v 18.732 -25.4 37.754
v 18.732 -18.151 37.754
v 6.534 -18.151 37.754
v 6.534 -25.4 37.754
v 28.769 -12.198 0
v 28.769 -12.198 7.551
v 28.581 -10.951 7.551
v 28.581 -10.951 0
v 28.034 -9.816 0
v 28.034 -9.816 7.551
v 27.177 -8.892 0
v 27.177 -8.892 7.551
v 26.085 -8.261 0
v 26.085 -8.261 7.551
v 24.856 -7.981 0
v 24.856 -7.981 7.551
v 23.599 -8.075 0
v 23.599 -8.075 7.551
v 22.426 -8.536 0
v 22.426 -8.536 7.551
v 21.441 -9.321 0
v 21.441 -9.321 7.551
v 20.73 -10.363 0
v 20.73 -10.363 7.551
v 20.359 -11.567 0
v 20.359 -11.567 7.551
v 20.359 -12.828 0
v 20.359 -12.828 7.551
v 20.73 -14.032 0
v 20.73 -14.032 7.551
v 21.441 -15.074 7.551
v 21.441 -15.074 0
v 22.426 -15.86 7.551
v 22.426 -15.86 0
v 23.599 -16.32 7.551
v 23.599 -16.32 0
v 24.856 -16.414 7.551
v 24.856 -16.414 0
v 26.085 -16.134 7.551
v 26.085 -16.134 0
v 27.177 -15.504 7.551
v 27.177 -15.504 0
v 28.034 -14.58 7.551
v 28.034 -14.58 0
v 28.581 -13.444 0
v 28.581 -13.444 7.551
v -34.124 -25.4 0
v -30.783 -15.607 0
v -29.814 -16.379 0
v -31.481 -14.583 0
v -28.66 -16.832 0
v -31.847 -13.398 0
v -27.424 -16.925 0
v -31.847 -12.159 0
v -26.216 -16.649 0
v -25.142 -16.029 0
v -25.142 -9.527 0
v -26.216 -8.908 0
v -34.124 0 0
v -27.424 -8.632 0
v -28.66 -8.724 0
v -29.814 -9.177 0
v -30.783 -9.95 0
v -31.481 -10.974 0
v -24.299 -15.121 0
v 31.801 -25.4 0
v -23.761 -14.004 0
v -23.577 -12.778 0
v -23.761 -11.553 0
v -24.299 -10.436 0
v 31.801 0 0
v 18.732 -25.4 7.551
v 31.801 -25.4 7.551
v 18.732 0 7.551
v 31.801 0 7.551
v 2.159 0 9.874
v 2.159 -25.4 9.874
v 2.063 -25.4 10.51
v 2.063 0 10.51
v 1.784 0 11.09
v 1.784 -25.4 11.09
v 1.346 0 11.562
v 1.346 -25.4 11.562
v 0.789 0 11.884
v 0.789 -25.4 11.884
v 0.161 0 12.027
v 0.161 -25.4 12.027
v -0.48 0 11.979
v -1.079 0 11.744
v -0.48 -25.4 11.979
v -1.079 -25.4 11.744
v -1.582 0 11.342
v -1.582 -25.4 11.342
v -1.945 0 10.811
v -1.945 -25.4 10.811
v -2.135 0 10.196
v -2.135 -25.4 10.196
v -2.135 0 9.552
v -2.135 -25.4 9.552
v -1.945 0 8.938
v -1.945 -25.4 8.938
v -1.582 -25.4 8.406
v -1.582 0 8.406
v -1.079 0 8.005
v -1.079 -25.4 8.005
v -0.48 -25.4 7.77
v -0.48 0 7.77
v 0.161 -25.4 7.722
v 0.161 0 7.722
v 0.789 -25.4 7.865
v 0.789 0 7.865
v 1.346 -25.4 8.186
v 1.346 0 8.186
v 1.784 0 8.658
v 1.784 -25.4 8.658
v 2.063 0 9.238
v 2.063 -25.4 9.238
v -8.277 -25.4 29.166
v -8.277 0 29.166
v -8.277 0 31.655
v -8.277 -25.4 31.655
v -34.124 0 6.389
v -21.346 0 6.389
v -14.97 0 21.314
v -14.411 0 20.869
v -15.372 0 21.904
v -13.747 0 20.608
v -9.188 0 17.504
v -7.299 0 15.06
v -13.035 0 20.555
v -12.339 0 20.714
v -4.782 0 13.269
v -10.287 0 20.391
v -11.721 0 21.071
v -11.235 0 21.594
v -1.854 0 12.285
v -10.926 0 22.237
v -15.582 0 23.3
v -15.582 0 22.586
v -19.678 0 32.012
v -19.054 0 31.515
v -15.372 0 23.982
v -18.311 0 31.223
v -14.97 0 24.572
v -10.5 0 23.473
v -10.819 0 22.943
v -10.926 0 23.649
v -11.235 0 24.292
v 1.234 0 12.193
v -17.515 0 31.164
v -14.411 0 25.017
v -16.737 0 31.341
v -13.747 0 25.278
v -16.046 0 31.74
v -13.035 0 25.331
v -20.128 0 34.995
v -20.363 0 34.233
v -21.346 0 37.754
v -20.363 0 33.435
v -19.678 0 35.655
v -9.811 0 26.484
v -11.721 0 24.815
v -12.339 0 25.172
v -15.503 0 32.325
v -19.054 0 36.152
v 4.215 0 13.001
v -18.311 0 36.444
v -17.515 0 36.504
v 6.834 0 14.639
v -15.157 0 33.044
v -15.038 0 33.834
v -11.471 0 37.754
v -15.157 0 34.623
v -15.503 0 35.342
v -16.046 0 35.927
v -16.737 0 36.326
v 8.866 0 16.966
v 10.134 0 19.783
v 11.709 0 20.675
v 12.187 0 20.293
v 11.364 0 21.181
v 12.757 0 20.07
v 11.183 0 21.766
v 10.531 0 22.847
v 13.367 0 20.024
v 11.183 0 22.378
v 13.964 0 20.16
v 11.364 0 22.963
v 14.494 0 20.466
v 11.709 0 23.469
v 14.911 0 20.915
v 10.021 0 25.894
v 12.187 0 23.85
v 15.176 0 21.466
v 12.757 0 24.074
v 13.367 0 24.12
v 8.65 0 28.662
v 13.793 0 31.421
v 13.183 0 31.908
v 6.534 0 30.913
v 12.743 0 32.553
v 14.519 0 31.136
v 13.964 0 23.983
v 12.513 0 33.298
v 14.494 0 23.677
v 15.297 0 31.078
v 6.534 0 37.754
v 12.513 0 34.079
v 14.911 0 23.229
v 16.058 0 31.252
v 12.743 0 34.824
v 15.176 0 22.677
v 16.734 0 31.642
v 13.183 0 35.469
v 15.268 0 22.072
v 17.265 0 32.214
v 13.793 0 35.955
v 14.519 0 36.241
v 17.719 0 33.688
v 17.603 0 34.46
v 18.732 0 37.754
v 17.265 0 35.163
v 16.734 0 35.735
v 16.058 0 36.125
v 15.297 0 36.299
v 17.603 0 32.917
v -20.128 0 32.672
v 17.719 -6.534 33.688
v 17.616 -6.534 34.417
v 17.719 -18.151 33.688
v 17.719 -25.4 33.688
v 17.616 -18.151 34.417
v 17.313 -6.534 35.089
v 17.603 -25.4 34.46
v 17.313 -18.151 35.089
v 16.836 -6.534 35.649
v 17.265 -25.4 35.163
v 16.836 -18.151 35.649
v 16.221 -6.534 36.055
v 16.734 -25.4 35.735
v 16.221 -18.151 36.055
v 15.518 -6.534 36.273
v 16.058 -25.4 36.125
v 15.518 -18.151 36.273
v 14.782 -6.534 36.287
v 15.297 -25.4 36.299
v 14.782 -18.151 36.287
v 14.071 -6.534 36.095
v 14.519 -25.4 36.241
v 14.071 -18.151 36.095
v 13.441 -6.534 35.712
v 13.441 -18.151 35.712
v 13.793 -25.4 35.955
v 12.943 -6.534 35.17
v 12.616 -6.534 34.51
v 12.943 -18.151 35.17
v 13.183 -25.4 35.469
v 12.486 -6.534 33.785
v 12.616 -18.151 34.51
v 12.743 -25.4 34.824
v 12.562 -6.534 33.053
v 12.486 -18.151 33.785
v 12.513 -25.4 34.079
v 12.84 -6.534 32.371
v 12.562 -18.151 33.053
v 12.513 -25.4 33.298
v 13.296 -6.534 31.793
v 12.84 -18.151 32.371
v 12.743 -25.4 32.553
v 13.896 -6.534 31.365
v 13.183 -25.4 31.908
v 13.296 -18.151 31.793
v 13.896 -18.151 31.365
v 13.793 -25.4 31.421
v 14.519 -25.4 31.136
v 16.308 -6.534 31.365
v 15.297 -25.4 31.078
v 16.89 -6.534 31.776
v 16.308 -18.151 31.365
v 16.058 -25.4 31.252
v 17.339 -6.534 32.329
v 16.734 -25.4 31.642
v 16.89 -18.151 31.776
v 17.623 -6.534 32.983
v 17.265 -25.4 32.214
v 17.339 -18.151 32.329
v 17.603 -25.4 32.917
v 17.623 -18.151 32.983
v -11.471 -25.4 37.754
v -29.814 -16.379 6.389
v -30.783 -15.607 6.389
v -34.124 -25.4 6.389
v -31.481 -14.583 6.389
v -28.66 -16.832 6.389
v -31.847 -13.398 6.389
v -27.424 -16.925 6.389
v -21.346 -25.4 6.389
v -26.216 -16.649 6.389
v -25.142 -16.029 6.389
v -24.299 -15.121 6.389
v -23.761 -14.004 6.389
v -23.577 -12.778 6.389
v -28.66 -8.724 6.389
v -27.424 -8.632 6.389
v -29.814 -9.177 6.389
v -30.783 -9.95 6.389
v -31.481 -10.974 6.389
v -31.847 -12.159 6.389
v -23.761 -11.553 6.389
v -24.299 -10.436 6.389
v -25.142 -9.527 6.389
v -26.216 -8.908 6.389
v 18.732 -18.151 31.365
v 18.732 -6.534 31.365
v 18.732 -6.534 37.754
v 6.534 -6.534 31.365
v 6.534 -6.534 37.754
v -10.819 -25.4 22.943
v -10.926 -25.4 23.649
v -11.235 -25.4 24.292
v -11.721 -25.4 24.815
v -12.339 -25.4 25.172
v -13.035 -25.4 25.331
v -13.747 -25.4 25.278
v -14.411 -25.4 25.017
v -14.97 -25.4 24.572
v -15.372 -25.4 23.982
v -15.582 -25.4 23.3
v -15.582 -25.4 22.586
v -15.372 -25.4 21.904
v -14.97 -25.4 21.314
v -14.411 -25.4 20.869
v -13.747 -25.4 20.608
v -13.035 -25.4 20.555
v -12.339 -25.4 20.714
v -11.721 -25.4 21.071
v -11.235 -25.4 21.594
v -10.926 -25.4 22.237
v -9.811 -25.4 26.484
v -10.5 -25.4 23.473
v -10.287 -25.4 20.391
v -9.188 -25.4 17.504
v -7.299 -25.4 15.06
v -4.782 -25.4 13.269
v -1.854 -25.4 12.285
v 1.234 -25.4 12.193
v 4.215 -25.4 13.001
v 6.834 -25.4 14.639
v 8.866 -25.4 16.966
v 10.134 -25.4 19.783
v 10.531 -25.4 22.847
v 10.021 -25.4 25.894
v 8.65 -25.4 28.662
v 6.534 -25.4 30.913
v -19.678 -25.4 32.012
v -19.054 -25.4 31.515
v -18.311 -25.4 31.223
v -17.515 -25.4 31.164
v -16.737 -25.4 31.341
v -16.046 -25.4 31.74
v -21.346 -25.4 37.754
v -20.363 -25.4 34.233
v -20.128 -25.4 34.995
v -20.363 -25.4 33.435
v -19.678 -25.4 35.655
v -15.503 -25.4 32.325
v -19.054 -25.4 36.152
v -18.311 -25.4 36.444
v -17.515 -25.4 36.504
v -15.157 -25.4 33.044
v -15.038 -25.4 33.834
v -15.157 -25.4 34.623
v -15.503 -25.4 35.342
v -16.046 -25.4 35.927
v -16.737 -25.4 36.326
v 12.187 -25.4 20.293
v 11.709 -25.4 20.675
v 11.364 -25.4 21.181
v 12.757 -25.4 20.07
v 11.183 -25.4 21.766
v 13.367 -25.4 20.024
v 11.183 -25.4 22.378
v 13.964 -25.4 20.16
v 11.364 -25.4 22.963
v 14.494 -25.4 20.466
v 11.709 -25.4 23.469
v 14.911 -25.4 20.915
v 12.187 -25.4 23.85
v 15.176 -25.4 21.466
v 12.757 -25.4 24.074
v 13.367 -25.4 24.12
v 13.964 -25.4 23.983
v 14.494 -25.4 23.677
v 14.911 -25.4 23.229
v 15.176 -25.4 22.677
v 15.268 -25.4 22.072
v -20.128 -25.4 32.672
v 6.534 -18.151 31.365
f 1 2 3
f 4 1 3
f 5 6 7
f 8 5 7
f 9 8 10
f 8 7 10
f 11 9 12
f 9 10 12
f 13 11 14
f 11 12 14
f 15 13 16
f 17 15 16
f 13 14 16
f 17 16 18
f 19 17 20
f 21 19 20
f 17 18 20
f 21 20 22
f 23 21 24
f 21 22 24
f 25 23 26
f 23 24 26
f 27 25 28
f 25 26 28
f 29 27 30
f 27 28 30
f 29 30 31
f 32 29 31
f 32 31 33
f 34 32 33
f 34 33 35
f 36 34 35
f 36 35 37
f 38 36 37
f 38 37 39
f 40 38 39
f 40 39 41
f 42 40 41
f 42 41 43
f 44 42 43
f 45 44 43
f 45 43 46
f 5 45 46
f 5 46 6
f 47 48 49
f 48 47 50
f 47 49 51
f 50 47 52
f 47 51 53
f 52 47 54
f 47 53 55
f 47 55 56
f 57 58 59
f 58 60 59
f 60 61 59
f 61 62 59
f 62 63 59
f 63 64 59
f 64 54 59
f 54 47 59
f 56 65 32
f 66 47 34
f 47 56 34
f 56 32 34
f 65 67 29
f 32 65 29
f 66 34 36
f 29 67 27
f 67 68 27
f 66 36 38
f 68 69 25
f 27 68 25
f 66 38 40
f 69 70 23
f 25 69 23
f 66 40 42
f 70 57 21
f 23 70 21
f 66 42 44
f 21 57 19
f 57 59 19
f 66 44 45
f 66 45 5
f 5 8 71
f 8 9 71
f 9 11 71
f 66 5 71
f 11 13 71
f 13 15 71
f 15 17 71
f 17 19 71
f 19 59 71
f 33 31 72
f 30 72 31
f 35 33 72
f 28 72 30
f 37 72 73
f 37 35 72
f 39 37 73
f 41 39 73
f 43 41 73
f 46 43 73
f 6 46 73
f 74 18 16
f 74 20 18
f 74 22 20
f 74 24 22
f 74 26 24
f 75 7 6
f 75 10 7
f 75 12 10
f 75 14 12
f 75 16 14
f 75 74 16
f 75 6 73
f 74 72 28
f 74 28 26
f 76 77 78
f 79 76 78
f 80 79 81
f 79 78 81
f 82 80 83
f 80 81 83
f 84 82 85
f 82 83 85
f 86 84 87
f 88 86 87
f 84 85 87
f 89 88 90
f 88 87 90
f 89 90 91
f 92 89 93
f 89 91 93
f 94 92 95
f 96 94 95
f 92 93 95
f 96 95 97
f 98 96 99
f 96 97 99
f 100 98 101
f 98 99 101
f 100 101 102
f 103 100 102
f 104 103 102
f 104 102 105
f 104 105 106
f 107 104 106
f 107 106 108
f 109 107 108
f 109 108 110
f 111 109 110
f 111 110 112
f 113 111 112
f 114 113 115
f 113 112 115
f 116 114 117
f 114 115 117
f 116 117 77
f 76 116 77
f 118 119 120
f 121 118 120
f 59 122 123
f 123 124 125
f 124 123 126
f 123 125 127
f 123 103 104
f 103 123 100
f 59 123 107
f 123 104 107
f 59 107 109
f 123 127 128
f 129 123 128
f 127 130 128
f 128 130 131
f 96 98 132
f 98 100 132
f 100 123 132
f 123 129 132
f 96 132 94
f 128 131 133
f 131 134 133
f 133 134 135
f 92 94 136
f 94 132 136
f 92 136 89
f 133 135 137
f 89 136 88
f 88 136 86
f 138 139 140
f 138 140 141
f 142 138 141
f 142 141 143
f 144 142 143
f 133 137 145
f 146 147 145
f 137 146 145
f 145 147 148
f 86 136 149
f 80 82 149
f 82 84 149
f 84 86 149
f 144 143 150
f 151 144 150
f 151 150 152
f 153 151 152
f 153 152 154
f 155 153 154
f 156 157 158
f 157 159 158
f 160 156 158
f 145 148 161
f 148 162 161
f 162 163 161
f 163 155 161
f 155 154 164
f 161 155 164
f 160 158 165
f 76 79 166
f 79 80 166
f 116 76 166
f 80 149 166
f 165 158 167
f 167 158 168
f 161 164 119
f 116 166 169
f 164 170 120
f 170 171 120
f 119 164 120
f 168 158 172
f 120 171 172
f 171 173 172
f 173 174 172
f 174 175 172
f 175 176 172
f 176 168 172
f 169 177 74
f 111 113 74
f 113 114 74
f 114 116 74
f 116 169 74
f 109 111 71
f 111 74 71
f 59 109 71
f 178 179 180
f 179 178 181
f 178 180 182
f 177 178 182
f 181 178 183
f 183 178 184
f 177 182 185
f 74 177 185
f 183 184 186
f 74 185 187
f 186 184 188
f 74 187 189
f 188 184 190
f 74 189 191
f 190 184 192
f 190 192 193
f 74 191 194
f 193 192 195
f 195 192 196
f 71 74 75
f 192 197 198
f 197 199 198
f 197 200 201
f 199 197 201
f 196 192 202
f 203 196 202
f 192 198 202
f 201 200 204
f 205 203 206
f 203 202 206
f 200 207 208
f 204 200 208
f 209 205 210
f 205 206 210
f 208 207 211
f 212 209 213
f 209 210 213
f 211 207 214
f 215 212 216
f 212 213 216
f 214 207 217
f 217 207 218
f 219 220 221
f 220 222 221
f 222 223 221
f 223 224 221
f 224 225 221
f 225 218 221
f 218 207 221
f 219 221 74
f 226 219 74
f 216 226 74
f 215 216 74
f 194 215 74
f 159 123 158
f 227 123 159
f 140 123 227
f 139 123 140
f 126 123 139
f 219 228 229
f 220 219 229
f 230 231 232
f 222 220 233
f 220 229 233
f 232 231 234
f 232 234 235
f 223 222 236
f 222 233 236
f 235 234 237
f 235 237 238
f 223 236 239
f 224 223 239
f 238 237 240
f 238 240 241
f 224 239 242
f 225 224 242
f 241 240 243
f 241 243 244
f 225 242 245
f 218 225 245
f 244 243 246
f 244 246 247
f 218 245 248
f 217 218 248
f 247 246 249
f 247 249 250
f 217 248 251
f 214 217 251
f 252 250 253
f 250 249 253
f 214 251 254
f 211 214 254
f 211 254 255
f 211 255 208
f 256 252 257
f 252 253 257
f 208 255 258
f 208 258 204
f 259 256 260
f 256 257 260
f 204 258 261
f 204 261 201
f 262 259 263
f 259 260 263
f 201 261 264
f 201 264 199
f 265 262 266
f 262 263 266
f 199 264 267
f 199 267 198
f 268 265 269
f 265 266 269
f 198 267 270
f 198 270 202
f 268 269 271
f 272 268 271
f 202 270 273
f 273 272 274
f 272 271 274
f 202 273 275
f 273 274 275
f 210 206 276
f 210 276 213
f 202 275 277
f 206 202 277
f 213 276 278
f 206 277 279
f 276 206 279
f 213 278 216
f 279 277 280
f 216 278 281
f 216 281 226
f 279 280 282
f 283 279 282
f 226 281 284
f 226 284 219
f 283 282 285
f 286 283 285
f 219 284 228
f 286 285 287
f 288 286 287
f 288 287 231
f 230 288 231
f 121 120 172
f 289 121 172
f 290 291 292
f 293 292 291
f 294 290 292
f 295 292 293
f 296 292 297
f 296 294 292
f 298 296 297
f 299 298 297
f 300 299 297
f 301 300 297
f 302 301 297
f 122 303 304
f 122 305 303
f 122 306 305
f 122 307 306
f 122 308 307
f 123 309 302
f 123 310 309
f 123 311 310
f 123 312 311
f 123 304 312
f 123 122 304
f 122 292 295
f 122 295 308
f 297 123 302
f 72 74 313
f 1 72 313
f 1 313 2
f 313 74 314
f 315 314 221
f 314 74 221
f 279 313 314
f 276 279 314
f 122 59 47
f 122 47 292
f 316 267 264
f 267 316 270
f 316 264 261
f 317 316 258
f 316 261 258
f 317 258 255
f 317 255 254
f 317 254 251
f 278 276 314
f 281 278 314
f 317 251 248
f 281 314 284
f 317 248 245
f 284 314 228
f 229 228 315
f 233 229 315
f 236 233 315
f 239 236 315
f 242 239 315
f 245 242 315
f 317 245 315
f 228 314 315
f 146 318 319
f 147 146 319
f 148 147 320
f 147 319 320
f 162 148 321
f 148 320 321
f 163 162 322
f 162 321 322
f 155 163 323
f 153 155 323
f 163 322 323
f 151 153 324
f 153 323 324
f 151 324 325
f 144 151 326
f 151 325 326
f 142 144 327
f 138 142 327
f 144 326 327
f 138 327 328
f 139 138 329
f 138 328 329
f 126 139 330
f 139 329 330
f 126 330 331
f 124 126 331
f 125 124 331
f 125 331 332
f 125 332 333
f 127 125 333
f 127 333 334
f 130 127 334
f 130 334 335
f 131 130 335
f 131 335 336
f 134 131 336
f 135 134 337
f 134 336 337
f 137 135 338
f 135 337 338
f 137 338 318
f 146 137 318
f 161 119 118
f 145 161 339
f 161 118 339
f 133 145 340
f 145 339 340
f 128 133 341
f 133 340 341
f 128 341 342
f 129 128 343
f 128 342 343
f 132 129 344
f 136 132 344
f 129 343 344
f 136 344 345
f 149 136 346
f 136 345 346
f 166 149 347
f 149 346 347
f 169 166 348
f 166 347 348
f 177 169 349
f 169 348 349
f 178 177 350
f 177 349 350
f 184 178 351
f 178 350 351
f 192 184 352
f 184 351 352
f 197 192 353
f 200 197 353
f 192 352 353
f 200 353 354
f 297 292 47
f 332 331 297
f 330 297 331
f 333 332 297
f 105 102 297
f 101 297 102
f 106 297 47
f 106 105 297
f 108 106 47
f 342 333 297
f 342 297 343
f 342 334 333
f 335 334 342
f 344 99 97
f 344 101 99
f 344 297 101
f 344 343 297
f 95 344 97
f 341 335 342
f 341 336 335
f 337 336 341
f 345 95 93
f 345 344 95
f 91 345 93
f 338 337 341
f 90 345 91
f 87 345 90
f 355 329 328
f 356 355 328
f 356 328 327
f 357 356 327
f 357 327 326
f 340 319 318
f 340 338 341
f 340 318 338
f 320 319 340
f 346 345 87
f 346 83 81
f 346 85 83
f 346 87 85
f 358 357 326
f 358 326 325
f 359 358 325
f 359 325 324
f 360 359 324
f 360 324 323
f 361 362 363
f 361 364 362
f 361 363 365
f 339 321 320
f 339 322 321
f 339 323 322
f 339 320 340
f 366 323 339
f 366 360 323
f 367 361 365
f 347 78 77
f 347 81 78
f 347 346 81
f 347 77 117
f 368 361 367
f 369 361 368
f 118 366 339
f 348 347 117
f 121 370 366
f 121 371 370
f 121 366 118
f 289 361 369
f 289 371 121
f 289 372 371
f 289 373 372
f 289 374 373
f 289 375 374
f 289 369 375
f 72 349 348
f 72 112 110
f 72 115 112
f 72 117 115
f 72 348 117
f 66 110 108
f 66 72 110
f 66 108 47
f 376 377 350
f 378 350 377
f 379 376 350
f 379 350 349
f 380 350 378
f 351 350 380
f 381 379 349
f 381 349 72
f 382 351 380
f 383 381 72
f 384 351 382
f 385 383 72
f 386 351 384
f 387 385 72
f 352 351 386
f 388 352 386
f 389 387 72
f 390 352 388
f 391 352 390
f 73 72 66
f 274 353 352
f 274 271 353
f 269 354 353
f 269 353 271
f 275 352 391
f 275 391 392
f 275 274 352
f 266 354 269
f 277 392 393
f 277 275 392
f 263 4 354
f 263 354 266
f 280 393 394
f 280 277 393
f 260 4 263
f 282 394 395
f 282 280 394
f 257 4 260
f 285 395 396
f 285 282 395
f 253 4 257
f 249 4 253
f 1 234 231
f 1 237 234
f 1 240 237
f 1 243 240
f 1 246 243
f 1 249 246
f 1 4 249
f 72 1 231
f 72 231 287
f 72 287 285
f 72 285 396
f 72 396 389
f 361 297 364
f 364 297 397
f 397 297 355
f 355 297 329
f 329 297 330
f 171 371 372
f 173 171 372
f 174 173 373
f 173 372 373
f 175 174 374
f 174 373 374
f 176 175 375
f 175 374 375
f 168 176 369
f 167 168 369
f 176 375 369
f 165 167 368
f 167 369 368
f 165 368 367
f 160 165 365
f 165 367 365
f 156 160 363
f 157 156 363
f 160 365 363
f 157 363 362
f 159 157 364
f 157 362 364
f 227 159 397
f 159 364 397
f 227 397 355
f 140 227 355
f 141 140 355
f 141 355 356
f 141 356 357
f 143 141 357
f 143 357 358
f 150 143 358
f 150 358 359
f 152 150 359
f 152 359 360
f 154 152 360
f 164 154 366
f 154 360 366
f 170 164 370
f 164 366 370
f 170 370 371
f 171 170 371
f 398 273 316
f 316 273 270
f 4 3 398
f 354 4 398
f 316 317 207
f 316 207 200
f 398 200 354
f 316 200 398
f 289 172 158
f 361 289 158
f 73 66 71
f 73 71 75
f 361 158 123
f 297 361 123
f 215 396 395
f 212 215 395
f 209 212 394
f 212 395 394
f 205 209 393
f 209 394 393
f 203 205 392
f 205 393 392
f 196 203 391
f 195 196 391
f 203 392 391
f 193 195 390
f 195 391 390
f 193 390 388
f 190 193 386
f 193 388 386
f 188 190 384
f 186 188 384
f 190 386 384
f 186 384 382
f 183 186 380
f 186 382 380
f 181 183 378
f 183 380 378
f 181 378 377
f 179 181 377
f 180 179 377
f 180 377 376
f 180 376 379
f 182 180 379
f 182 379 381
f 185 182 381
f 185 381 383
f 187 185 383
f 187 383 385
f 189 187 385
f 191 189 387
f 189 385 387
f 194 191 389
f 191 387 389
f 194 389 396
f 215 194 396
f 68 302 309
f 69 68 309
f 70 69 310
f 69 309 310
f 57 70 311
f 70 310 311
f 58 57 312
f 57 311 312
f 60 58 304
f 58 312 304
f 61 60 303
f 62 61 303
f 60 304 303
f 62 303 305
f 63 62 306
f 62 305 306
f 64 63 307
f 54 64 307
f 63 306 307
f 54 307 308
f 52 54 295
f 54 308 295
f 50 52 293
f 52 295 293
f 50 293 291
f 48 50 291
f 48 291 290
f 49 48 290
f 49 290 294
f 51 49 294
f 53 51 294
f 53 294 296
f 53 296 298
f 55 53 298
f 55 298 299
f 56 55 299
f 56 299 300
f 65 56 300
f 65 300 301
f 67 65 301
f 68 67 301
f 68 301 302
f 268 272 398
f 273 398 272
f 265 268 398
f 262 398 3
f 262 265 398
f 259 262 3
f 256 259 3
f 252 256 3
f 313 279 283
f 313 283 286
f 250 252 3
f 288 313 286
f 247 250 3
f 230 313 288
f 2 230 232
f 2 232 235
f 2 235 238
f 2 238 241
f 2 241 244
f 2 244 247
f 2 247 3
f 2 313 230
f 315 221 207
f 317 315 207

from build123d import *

# Parameters (mm, degrees)
F0_W       = 12.7783659846
F0_H       = 6.3891834579
F0_W_2     = 13.0687858909
F0_H_2     = 7.5508533046
F1_DEPTH   = 25.4
F2_R       = 10.532388255
F3_DEPTH   = 25.4
F4_R       = 2.0535610712
F4_R_2     = 2.1586830731
F4_R_3     = 2.3948426669
F5_DEPTH   = 25.4
F6_R       = 4.2285410778
F6_R_2     = 4.1581451927
F1_FACE2_W = 65.9247562289
F1_FACE2_H = 25.4
F7_DEPTH   = 7.5518533046
F8_R       = 2.677519439
F8_R_2     = 2.6177858958
F9_DEPTH   = 25.4
F10_W      = 11.6166961379
F10_H      = 11.0358633101
F11_DEPTH  = 12.1975312941


with BuildPart() as f1:
    # F0 (on Front) → F1 (new body)
    with BuildSketch(Plane.XZ):
        with Locations((-27.7348635718, 3.194591729)):
            Rectangle(F0_W, F0_H)
        Polygon((-21.3456805795, 6.3891834579), (-21.3456805795, 0), (0, 0), (18.7319237739, 0), (18.7319237739, 7.5508533046), (18.7319237739, 37.7542637289), (6.5343924798, 37.7542637289), (6.5343924798, 28.0633459114), (-8.2768974826, 28.0633459114), (-8.2768974826, 31.655497849), (-11.4714885131, 37.7542637289), (-21.3456805795, 37.7542637289), (-21.3456805795, 14.8112885654), align=None)
        with Locations((25.2663167194, 3.7754266523)):
            Rectangle(F0_W_2, F0_H_2)
    extrude(amount=F1_DEPTH)

    # F2 (on face) → F3 (cut, through all)
    with BuildSketch(Plane.XZ.offset(25.4)):
        with Locations((0, 22.6525589824)):
            Circle(F2_R)
    extrude(amount=-F3_DEPTH, mode=Mode.SUBTRACT)

    # F4 (on face) → F5 (cut, through all)
    with BuildSketch(Plane.XZ.offset(25.4)):
        with Locations((13.2139939815, 22.0717247576)):
            Circle(F4_R)
        with Locations((0, 9.8741920665)):
            Circle(F4_R_2)
        with Locations((-13.2139930502, 22.9429770261)):
            Circle(F4_R_3)
    extrude(amount=-F5_DEPTH, mode=Mode.SUBTRACT)

    # F6 (on face) + F1_face2 (on face) → F7 (cut, through all)
    with BuildSketch(Plane.XY.offset(7.5508533046)):
        with Locations((24.54027161, -12.1975317597)):
            Circle(F6_R)
        with Locations((-27.7348645031, -12.7783669159)):
            Circle(F6_R_2)
    with BuildSketch(Plane(origin=(-1.1616684496, -12.7, 0), x_dir=(1, 0, 0), z_dir=(0, 0, -1))):
        Rectangle(F1_FACE2_W, F1_FACE2_H)
    extrude(amount=-F7_DEPTH, dir=(0, 0, 1), mode=Mode.SUBTRACT)

    # F8 (on face) → F9 (cut, through all)
    with BuildSketch(Plane.XZ.offset(25.4)):
        with Locations((-17.7154634148, 33.833630383)):
            Circle(F8_R)
        with Locations((15.1017084718, 33.6884185672)):
            Circle(F8_R_2)
    extrude(amount=-F9_DEPTH, mode=Mode.SUBTRACT)

    # F10 (on face) → F11 (cut, through all)
    with BuildSketch(Plane.YZ.offset(18.7319237739)):
        with Locations((-12.3427396175, 36.8830133229)):
            Rectangle(F10_W, F10_H)
    extrude(amount=-F11_DEPTH, mode=Mode.SUBTRACT)


solid = f1.part
